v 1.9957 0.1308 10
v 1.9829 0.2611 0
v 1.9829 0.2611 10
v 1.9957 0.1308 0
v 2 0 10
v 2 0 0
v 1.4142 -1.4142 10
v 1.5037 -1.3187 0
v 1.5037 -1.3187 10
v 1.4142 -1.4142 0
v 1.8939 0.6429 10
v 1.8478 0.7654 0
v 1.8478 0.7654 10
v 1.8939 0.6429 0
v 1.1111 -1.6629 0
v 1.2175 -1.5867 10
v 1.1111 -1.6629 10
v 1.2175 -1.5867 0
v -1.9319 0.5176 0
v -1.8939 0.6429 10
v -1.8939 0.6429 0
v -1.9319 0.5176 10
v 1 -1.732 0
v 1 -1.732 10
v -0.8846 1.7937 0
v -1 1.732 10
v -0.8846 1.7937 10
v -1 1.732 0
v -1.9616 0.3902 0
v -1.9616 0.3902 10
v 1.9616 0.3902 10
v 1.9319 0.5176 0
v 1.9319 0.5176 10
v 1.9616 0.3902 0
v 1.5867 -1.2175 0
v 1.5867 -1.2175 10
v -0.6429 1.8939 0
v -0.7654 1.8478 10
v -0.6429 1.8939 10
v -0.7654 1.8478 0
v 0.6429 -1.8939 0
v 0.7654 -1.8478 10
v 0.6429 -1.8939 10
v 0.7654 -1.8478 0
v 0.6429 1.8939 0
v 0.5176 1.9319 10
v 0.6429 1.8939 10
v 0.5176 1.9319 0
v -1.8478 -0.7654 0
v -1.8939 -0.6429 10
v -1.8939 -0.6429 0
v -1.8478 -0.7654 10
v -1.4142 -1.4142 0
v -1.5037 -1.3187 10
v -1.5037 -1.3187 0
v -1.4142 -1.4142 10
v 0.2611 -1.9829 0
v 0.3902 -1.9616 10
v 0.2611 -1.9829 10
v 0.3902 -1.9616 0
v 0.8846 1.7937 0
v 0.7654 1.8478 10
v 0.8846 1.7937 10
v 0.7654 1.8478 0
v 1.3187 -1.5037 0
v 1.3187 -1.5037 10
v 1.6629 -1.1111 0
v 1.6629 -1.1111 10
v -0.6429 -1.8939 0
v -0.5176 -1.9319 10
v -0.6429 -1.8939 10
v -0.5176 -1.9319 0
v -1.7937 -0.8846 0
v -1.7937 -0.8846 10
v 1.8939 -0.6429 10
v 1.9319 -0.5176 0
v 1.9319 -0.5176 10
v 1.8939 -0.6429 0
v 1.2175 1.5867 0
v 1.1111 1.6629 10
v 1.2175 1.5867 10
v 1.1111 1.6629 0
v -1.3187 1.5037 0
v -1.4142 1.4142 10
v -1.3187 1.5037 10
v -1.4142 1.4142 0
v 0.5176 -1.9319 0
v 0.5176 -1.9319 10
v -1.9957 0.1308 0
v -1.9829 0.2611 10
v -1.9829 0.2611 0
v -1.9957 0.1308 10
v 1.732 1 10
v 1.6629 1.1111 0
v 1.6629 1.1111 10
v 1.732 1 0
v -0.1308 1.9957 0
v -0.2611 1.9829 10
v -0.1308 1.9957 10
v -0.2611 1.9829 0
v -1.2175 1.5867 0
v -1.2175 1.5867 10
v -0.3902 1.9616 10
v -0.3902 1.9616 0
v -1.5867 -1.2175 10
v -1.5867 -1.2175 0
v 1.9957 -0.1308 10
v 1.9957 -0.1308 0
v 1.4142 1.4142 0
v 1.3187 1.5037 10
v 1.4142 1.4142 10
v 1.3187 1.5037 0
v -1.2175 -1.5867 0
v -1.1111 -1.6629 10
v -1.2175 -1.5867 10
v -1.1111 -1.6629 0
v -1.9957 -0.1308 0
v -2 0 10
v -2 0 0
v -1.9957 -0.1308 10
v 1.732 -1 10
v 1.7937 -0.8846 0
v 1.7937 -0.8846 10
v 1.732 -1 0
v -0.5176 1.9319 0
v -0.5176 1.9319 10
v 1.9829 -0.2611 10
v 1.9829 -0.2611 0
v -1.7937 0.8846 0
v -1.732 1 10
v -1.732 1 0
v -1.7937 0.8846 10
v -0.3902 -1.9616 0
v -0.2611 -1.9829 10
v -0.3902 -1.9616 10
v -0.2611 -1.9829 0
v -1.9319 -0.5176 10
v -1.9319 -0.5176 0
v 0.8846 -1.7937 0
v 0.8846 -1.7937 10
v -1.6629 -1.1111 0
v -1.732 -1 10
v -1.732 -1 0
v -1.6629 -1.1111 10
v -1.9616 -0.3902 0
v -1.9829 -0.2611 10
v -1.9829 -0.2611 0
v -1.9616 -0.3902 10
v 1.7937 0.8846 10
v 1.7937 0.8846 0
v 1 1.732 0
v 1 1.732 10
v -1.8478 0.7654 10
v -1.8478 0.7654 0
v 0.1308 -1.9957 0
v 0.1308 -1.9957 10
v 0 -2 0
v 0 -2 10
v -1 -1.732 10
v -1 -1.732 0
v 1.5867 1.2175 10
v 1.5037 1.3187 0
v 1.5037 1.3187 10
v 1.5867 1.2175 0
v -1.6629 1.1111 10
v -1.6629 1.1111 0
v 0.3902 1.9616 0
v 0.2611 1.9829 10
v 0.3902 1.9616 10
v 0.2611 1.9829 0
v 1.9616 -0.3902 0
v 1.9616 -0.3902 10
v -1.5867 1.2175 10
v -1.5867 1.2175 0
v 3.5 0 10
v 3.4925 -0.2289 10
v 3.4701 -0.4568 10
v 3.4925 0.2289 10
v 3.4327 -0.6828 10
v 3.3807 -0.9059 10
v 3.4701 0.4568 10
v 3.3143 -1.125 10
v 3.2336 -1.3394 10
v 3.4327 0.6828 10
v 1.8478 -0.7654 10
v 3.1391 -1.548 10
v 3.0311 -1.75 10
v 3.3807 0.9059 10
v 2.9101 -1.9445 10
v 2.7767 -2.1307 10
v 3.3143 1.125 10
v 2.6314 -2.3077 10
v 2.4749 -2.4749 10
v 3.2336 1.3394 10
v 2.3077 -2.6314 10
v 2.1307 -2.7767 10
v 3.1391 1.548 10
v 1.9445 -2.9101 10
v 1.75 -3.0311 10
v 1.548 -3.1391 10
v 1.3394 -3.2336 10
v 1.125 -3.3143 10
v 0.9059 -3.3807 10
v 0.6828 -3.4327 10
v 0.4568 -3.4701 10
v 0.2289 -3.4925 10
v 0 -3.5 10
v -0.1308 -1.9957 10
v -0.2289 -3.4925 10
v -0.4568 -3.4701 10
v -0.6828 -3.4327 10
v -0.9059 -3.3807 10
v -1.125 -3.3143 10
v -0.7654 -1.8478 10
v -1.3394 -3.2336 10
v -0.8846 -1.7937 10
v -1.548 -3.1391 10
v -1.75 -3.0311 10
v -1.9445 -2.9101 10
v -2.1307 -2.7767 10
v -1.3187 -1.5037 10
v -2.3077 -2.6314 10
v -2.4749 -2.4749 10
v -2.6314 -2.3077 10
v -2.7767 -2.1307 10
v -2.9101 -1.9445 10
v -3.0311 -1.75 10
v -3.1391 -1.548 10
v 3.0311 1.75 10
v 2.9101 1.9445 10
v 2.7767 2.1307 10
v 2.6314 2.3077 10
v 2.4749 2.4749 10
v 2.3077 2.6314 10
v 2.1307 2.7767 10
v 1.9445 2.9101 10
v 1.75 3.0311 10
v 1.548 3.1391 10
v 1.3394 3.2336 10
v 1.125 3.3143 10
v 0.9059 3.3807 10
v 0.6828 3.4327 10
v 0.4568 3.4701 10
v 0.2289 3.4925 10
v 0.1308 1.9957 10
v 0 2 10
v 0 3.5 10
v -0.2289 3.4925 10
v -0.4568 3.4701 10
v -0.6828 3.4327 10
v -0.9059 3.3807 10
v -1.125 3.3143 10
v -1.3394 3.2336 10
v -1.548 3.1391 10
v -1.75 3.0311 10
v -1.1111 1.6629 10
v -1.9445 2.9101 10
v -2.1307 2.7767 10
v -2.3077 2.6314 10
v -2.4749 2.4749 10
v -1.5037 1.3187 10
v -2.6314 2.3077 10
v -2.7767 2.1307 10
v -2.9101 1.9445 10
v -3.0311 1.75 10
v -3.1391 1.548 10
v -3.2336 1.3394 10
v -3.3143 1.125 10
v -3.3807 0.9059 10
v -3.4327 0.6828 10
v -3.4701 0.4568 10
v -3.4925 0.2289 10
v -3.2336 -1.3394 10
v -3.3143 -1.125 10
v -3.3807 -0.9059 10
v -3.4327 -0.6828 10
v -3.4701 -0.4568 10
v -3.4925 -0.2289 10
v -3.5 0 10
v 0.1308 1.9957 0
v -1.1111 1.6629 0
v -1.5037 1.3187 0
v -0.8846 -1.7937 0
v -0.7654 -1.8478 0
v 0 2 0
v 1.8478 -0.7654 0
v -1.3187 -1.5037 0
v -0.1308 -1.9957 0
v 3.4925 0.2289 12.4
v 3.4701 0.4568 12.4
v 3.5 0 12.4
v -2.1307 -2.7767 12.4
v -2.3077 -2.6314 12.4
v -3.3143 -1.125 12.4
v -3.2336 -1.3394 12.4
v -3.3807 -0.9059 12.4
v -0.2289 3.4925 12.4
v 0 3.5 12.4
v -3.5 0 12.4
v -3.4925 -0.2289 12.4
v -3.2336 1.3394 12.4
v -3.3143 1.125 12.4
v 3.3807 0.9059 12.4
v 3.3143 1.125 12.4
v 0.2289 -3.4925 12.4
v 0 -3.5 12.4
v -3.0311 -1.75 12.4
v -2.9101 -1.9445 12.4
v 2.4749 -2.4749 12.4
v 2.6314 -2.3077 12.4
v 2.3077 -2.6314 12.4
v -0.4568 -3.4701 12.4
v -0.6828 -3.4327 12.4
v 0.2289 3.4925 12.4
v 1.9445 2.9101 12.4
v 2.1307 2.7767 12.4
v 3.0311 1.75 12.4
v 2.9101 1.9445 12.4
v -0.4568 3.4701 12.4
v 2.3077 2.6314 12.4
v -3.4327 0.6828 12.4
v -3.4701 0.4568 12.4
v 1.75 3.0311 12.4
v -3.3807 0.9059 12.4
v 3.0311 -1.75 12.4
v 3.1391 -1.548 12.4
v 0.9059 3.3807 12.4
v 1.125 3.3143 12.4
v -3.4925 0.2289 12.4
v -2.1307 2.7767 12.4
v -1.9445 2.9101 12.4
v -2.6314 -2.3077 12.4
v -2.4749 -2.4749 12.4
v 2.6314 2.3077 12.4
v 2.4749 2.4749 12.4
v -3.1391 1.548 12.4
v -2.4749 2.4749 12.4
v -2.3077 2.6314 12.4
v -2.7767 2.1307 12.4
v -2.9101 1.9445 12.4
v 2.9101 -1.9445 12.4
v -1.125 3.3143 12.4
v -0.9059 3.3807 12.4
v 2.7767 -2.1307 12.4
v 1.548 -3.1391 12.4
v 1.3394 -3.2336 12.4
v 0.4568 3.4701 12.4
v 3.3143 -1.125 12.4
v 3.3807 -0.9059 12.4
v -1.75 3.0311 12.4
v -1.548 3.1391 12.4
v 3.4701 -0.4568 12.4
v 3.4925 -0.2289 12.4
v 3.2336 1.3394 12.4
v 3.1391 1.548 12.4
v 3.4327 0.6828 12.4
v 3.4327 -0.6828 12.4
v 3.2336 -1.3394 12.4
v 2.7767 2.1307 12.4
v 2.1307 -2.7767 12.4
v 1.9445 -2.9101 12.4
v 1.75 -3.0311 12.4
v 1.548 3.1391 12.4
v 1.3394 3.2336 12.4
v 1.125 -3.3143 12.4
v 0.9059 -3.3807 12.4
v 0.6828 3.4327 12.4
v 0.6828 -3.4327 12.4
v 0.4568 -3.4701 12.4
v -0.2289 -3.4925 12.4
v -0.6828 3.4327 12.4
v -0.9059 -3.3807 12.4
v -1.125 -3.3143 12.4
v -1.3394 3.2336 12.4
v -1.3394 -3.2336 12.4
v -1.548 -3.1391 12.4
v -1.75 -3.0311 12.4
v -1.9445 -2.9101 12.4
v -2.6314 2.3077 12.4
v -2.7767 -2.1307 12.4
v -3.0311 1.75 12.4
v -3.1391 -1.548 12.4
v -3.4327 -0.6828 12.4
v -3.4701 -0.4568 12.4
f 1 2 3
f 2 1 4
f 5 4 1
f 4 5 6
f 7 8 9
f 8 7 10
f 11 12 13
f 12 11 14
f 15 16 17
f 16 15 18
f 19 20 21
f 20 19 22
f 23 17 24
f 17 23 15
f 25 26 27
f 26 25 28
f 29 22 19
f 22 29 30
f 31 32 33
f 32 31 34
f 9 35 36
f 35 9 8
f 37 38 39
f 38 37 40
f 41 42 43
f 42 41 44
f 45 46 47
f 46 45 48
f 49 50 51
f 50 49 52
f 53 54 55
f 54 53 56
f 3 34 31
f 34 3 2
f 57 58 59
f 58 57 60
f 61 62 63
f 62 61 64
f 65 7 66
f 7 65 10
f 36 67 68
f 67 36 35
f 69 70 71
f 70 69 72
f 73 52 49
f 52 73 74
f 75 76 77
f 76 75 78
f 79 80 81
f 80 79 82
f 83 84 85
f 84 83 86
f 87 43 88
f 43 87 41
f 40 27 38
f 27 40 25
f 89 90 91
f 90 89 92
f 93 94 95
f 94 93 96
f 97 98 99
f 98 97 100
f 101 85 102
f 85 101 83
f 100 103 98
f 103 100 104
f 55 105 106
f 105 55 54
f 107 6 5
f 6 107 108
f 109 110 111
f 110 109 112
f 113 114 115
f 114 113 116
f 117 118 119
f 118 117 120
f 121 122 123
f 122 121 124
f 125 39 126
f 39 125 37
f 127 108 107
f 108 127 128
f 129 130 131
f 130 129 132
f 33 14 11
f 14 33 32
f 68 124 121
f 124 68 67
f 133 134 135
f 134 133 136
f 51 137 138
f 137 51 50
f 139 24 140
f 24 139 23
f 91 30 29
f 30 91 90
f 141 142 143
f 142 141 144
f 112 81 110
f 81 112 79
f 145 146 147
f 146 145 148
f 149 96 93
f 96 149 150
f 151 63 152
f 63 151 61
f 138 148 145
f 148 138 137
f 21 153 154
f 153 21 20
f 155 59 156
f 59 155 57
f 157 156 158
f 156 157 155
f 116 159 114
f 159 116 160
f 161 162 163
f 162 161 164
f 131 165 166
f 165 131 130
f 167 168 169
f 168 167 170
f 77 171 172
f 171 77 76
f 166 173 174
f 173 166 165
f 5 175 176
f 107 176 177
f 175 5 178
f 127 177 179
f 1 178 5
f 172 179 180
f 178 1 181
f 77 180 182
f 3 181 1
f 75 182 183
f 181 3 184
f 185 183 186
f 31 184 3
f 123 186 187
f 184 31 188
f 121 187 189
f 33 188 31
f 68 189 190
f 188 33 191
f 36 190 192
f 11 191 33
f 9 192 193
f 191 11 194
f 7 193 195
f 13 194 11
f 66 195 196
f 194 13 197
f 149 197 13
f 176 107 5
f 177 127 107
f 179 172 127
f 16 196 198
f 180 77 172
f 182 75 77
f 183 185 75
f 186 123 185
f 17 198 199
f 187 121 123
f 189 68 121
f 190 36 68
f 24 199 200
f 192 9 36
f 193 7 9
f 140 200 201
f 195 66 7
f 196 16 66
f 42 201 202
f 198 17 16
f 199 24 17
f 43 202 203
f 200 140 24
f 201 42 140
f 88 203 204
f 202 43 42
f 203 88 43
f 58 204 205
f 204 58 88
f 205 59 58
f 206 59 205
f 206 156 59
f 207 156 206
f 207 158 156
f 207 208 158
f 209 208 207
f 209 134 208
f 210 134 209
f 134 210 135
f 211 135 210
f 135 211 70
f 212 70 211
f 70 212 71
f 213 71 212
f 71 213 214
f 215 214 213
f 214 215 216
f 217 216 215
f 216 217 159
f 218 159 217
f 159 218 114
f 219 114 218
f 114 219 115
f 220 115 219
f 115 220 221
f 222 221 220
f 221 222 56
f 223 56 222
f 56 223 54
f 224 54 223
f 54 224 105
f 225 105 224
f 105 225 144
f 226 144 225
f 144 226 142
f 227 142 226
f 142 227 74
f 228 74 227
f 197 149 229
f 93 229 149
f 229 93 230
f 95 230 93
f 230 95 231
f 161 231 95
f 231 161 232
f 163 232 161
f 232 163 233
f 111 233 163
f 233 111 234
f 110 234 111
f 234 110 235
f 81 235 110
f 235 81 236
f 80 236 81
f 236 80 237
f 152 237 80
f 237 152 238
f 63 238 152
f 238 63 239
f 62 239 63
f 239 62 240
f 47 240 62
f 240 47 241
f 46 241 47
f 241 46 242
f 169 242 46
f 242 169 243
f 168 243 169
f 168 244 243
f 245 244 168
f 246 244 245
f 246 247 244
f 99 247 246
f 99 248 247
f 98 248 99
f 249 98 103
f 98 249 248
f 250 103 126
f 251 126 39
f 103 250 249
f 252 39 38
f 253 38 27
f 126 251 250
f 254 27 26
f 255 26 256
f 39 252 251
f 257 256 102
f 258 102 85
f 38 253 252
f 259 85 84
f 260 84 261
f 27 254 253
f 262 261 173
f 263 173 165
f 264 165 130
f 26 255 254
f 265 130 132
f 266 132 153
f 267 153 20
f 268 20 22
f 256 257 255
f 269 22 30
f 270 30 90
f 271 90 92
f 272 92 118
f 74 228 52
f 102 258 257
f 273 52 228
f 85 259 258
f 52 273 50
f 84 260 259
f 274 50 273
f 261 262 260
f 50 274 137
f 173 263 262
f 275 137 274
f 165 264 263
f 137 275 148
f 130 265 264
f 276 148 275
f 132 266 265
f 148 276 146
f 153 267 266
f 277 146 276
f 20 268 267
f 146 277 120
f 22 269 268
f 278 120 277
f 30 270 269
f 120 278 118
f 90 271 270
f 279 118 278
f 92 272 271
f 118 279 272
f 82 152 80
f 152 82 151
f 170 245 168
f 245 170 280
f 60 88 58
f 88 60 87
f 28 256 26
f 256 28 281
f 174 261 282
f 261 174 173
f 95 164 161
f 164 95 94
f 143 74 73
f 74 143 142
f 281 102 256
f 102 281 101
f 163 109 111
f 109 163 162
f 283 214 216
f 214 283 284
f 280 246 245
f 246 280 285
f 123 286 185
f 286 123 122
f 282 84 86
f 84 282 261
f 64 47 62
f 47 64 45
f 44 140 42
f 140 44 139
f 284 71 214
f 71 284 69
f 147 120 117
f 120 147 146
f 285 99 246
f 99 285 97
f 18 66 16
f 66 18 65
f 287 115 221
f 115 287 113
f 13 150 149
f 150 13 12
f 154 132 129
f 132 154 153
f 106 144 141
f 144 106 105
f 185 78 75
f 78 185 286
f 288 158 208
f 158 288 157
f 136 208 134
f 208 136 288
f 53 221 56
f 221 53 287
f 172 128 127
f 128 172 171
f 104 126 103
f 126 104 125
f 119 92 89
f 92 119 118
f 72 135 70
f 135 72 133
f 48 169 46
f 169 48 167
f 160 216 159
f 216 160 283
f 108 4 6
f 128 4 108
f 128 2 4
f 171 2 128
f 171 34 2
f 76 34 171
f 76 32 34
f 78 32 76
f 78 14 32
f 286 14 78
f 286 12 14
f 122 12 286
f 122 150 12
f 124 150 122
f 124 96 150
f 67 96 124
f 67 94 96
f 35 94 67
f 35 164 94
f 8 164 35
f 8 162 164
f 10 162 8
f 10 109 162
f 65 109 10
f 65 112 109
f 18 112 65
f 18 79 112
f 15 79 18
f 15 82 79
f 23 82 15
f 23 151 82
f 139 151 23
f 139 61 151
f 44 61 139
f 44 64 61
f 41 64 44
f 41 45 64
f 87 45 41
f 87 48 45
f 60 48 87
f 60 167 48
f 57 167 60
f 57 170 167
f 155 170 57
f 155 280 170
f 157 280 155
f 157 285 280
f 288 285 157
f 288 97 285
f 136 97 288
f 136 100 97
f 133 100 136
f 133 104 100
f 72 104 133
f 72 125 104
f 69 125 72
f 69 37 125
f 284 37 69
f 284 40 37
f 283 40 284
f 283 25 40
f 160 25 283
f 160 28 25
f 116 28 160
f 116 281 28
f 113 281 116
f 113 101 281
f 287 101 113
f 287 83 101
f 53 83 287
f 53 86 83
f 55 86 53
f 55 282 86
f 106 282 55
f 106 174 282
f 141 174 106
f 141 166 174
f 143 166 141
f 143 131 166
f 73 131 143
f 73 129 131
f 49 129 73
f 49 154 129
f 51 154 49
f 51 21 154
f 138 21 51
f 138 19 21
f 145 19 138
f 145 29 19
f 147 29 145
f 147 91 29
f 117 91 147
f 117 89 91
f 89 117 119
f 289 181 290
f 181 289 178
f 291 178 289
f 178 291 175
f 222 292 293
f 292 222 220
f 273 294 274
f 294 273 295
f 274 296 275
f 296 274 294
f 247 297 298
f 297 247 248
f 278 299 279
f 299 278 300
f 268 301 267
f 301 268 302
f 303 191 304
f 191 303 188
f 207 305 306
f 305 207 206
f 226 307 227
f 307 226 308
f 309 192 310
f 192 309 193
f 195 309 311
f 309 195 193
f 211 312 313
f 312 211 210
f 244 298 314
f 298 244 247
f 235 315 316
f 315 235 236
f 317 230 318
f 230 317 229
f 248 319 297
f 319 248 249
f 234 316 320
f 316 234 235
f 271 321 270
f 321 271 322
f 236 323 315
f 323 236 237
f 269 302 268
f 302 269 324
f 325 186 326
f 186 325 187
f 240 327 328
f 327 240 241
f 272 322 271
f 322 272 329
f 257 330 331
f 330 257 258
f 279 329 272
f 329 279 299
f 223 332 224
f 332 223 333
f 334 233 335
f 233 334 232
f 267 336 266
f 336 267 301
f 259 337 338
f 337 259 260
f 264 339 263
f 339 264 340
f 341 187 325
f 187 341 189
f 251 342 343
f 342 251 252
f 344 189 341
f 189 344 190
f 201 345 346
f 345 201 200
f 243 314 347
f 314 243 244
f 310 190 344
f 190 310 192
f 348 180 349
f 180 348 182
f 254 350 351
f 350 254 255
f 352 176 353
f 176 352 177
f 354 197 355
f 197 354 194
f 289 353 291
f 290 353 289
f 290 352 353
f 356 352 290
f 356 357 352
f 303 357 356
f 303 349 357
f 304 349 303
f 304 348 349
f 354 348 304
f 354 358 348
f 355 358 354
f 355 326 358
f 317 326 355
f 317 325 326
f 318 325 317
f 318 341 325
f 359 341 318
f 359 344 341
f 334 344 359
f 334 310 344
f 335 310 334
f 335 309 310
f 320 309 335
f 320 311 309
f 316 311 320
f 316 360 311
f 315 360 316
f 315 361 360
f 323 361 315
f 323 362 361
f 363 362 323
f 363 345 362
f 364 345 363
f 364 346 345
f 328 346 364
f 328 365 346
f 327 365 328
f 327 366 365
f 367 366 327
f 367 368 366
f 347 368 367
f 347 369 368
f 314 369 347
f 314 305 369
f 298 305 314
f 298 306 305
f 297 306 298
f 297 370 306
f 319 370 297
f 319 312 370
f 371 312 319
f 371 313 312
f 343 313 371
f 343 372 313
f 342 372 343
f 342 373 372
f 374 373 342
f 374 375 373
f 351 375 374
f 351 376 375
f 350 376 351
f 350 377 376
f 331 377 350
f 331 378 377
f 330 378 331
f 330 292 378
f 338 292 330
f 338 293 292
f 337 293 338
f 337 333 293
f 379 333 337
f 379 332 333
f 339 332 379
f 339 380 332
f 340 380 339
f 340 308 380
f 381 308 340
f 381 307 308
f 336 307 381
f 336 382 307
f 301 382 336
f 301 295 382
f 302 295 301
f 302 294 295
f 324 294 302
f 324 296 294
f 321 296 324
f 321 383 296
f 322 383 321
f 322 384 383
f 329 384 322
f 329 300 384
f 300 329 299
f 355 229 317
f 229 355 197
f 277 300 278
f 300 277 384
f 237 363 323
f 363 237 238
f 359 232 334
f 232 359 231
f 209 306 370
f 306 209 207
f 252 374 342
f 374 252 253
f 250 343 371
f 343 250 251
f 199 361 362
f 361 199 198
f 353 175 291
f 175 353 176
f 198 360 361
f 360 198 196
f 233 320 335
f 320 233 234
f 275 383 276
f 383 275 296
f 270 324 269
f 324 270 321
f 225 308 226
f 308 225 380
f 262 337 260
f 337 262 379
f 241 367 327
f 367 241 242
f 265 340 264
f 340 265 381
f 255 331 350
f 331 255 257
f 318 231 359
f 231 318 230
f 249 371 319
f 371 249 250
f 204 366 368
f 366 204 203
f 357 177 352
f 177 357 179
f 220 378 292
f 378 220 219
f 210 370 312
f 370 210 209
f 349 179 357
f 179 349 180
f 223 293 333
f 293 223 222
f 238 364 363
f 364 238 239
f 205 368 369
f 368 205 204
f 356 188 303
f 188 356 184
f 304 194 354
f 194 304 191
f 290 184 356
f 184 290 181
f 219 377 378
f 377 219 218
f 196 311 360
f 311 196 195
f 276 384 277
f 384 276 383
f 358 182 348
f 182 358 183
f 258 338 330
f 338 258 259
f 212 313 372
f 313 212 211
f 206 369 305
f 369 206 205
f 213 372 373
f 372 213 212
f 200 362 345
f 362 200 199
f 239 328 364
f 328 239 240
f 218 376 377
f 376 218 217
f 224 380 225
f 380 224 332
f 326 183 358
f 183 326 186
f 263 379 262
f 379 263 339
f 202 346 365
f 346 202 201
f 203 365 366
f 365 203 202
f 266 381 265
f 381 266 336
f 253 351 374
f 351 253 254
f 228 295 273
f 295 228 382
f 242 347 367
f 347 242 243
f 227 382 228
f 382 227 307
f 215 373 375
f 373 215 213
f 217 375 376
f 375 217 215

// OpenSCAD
$fn=96;

shaft_d = 4.0;
head_d  = 7.0;
head_h  = 2.4;
len     = 10.0;

module screw(shaft_d, head_d, head_h, len){
    union(){
        // Shaft
        cylinder(h=len, d=shaft_d);

        // Head (simple cylindrical head)
        translate([0,0,len])
            cylinder(h=head_h, d=head_d);
    }
}

screw(shaft_d, head_d, head_h, len);
